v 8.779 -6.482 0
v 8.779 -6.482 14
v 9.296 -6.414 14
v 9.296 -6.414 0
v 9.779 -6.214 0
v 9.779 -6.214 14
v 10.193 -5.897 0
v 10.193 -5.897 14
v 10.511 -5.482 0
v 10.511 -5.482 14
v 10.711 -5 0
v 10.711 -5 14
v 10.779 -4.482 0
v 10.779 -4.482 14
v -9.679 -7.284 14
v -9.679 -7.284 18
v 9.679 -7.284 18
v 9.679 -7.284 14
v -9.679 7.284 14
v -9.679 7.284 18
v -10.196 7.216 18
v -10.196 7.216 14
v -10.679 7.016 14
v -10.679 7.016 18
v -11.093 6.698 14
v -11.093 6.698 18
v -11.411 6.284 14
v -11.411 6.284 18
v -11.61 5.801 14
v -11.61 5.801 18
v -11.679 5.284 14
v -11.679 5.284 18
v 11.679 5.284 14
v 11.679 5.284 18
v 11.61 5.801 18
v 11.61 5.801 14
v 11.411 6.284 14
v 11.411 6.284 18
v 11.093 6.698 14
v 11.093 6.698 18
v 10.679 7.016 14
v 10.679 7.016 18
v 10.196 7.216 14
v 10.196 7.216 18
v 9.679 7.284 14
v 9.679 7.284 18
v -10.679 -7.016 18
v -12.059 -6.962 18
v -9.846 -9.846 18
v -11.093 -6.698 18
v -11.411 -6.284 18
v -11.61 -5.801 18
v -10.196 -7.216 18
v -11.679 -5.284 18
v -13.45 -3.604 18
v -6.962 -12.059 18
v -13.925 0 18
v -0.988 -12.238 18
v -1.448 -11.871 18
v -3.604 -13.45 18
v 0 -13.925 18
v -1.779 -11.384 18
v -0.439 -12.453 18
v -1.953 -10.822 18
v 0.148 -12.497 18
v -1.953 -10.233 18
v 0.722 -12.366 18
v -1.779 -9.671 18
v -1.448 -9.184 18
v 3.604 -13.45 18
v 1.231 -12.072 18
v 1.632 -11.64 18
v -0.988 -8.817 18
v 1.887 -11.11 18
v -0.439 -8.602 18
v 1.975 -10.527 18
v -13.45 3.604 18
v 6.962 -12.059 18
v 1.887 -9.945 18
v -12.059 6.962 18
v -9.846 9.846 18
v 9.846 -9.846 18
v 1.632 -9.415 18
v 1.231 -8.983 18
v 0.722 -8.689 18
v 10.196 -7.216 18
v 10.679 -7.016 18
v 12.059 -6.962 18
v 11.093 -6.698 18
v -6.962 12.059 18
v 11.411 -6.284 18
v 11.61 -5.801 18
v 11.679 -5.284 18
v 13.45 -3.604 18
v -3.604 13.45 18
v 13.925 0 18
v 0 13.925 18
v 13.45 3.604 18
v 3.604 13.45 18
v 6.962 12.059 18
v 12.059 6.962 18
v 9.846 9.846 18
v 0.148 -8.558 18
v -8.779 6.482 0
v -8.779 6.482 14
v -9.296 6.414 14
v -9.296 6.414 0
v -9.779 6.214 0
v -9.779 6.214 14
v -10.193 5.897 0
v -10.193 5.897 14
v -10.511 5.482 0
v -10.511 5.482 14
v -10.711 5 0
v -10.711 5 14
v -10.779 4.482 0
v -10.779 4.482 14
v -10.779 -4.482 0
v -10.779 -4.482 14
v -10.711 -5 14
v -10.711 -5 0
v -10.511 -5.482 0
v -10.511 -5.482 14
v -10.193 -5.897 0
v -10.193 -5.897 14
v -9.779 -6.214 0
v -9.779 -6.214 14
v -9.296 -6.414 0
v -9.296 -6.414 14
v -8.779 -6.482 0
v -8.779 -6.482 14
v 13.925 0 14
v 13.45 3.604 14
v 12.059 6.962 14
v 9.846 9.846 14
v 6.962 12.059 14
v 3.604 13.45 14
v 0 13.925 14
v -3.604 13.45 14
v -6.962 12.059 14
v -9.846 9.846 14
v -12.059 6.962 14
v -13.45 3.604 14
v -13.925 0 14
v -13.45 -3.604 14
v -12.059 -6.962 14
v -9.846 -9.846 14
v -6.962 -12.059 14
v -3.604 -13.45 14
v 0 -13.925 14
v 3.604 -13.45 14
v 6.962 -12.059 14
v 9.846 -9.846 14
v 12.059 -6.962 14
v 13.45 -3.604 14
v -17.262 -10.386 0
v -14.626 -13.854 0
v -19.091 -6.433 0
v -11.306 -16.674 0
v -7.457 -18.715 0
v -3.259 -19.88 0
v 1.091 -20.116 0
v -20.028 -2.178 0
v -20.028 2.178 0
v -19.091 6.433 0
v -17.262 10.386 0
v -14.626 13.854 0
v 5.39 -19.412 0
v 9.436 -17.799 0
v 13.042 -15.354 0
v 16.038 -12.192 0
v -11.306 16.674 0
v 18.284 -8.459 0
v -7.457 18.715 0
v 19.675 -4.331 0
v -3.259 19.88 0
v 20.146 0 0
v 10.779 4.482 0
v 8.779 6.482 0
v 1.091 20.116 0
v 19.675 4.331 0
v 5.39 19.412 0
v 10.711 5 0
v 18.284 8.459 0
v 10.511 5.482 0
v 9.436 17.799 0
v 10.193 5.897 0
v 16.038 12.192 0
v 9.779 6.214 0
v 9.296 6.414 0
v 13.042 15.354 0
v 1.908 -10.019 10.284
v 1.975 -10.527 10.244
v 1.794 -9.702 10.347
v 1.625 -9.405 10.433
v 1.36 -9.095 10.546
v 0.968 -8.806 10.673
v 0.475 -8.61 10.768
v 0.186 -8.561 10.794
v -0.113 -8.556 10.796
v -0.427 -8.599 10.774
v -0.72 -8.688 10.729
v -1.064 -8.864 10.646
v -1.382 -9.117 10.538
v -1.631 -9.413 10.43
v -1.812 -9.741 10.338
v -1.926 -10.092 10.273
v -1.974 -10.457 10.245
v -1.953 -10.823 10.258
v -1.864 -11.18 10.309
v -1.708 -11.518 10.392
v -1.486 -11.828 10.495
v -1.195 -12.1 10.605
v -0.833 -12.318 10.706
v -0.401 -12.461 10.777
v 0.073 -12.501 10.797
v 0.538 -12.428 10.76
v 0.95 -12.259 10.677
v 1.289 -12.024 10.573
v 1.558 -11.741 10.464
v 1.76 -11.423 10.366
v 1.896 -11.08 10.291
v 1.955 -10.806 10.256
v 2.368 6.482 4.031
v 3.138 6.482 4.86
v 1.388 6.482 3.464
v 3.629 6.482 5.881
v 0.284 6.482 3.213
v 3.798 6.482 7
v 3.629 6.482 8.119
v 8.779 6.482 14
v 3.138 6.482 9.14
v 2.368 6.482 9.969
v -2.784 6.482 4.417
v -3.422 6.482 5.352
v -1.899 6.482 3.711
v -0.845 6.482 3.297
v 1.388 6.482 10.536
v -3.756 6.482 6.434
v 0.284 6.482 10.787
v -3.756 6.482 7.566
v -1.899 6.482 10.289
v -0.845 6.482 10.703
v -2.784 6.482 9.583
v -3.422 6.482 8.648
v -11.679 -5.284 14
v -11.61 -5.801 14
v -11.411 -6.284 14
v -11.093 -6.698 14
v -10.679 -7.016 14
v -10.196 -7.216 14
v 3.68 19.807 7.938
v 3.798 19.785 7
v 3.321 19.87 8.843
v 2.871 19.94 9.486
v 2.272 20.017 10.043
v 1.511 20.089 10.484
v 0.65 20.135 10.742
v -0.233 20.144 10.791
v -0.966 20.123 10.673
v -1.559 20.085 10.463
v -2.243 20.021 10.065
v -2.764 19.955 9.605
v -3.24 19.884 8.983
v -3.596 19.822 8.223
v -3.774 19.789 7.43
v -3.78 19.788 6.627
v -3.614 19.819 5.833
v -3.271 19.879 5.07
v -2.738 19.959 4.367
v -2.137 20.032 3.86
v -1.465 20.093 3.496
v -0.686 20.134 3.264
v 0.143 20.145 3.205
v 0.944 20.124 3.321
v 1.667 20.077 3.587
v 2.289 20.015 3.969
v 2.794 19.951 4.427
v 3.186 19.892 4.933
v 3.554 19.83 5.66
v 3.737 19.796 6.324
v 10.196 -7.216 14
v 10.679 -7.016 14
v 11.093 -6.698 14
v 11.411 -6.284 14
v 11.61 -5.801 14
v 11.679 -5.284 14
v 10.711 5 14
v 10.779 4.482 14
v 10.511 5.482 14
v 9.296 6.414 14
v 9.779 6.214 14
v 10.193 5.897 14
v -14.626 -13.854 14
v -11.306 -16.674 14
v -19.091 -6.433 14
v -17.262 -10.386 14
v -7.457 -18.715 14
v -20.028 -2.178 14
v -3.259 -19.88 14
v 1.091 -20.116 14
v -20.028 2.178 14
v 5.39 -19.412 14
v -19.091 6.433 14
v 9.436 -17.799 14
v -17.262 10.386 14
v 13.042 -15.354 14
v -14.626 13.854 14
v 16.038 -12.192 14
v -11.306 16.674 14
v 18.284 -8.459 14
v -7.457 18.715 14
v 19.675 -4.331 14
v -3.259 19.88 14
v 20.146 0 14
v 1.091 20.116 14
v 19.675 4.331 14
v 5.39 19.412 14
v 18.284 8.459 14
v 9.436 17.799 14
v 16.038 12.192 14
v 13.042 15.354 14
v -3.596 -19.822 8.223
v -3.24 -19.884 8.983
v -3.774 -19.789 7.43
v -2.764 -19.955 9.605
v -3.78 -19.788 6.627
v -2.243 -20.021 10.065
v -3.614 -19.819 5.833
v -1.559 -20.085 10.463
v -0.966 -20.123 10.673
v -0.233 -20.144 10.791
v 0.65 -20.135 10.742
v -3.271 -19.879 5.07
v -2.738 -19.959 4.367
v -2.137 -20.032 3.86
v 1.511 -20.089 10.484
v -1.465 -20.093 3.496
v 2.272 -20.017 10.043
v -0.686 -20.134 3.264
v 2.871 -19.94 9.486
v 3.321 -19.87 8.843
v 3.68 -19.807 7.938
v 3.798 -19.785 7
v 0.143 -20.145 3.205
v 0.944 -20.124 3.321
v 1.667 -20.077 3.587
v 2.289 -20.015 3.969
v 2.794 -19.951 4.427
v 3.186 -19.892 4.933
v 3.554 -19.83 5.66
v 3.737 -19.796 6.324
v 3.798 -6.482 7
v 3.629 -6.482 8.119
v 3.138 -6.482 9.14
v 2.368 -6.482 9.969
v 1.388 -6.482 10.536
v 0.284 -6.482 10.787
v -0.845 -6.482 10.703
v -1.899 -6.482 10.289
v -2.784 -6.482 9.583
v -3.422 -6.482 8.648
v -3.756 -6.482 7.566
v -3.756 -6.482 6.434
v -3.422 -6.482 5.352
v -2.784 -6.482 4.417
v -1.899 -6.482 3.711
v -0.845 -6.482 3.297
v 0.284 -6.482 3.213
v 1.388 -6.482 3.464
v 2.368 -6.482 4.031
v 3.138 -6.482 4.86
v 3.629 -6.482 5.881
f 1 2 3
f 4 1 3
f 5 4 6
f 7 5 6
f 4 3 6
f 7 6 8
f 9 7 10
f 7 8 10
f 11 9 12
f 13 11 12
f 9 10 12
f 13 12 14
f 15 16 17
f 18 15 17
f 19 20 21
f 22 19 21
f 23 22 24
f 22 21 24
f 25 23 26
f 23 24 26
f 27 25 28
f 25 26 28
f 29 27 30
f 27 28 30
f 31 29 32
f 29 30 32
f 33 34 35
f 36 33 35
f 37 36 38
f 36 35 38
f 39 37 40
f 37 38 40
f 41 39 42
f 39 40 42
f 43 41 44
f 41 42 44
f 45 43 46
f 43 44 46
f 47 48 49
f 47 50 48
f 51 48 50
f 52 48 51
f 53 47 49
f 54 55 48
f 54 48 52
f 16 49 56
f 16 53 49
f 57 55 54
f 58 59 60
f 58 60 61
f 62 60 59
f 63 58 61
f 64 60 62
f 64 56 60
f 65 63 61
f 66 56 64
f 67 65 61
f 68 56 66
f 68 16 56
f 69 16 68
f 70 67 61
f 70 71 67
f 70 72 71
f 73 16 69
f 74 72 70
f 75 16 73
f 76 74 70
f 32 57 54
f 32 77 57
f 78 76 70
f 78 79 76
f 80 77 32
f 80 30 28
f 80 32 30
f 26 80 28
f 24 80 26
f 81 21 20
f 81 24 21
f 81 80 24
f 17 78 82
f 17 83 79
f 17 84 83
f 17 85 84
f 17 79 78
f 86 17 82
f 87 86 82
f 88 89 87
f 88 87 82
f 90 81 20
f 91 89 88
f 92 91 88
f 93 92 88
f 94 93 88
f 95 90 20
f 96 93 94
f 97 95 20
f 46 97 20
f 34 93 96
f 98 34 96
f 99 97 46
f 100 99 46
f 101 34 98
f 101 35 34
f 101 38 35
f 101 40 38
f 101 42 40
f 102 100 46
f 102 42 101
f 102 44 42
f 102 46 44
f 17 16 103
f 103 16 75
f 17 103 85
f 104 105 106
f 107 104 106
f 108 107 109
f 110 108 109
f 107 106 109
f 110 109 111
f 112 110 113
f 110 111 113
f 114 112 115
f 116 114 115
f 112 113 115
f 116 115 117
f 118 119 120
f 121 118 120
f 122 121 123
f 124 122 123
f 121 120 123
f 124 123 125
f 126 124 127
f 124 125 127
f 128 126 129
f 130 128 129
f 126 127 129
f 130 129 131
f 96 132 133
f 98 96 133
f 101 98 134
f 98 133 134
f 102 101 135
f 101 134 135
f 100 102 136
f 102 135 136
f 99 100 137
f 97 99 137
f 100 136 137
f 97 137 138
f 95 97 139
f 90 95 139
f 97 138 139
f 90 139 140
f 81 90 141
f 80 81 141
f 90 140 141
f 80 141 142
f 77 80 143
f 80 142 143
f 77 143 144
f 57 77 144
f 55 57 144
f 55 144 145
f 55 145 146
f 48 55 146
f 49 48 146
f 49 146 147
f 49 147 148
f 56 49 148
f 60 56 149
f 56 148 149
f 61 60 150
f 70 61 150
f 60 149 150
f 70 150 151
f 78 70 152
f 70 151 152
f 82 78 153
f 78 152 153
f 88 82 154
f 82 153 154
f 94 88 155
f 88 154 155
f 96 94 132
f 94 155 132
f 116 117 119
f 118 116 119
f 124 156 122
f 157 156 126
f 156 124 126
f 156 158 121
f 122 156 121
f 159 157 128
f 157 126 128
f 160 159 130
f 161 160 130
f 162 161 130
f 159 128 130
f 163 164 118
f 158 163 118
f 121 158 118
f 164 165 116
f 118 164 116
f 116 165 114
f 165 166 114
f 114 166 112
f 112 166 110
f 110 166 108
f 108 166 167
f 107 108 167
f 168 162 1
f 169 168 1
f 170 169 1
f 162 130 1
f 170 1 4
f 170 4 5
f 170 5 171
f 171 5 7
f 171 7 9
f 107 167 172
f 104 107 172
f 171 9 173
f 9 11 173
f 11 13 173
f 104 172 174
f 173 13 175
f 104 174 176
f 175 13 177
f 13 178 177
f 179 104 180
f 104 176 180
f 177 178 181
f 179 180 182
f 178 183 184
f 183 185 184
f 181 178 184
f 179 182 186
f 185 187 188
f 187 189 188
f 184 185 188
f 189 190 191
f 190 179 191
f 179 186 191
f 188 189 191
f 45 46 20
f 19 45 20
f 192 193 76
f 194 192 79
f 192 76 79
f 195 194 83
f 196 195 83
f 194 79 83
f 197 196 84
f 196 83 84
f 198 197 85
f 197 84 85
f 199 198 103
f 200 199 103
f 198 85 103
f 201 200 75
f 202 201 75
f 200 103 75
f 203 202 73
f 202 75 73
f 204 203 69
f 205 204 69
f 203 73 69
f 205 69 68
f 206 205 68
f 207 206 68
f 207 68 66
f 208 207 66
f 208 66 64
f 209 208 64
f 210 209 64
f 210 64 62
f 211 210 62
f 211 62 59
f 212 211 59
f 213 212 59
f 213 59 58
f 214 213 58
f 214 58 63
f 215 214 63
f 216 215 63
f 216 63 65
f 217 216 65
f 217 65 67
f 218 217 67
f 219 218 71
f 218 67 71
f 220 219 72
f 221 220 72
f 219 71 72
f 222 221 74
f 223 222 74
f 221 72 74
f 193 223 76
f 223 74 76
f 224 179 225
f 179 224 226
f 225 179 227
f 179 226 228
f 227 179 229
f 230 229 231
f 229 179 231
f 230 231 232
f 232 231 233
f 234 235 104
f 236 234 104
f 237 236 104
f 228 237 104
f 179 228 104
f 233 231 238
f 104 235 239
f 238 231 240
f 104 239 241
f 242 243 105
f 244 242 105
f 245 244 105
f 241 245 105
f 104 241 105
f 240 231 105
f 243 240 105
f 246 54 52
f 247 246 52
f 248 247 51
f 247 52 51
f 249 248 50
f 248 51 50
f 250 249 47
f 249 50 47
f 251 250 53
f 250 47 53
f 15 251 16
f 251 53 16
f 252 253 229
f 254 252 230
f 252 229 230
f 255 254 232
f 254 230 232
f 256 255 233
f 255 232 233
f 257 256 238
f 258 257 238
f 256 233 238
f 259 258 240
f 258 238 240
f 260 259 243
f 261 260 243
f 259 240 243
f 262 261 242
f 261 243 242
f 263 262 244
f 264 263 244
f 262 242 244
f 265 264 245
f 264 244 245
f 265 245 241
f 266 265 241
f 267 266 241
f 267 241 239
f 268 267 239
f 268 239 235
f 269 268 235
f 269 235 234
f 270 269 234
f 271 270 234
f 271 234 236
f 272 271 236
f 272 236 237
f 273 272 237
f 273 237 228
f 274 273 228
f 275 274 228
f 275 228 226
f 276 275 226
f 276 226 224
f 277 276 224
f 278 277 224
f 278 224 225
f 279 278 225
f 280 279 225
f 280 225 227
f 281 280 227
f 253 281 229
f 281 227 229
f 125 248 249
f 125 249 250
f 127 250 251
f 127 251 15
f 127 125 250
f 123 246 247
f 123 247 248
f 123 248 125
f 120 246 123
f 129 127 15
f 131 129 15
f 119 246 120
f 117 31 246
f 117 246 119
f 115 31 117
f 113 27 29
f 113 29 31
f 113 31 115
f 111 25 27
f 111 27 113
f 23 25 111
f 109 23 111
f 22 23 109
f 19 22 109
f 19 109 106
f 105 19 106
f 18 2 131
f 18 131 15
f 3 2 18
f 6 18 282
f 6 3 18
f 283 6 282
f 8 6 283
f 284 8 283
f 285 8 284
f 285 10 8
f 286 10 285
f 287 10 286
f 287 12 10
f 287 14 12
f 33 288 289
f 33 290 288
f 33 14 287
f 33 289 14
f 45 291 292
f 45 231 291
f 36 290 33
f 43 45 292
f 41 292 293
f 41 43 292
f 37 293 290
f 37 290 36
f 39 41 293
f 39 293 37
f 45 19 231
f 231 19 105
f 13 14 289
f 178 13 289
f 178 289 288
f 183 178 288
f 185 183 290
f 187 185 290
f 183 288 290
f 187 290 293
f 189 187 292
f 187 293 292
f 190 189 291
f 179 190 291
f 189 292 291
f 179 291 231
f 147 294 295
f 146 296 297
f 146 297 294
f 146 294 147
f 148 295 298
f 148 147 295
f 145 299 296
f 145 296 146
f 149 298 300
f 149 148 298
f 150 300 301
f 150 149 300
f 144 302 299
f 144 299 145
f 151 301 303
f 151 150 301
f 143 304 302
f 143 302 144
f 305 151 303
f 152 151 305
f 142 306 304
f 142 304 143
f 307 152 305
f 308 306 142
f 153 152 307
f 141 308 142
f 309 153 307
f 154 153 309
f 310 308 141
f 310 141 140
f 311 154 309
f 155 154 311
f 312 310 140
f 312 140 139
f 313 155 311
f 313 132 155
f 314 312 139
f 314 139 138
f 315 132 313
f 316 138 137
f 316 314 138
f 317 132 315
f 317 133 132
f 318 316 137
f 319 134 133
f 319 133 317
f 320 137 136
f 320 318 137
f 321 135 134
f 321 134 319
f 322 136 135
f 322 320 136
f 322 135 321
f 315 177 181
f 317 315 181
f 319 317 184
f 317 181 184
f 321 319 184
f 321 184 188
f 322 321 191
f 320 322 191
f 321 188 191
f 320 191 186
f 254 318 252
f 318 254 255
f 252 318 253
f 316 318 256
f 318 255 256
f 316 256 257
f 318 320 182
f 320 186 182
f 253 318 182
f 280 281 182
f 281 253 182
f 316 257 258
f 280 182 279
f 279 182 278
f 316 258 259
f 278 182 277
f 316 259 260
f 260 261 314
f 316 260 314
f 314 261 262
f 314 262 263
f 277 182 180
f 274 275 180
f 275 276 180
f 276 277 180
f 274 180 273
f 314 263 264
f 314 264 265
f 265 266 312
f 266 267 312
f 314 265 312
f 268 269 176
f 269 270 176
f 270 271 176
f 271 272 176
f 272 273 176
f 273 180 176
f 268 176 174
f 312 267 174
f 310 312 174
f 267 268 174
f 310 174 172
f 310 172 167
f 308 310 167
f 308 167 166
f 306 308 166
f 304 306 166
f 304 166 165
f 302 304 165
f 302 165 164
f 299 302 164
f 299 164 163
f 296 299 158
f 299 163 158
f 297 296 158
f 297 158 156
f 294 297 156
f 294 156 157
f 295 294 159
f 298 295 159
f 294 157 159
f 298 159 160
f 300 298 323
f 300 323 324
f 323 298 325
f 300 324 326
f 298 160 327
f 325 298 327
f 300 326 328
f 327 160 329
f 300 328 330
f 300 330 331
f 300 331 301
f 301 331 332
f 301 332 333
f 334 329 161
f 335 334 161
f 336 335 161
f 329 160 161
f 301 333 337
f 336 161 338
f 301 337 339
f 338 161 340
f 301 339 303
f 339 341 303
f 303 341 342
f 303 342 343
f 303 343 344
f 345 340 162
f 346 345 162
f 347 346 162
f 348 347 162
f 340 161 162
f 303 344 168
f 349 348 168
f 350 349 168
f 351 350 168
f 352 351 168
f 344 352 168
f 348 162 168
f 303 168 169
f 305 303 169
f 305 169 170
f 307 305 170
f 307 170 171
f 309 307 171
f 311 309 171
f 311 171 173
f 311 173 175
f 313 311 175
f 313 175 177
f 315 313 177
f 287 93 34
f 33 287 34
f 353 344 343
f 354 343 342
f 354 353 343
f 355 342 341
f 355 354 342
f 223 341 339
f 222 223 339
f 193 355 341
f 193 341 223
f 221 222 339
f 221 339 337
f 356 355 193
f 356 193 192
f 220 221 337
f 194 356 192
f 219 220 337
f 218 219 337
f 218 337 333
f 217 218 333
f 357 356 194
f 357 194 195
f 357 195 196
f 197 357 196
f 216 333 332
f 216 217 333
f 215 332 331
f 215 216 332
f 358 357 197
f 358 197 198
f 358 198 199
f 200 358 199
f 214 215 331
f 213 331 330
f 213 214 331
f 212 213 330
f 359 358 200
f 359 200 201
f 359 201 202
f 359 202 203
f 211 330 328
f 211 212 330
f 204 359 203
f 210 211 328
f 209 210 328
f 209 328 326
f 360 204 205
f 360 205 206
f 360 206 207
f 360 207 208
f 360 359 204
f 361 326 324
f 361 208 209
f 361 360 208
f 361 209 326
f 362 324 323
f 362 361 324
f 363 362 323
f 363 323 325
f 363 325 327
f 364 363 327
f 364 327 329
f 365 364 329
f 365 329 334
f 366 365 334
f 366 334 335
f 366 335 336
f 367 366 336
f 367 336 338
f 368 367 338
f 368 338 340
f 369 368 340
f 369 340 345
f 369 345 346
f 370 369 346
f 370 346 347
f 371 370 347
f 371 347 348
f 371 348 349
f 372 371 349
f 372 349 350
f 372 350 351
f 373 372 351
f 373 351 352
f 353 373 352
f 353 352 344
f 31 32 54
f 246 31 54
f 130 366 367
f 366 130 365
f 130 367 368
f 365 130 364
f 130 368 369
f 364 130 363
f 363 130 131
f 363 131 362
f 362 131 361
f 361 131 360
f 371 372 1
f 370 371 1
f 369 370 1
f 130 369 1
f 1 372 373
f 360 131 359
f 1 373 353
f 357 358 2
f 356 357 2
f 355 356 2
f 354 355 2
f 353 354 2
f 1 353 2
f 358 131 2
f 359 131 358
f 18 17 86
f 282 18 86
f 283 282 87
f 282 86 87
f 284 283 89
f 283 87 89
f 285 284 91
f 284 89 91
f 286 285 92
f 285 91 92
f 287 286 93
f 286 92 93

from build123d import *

# Parameters (mm, degrees)
SKETCH_R             = 20.14583
PAD_DEPTH            = 14
SKETCH001_R          = 13.924934
PAD001_DEPTH         = 4
POCKET_DEPTH         = 4
POCKET001_DEPTH      = 18.001
SKETCH004_R          = 3.798047
POCKET002_DEPTH      = 20.14683
POCKET002_DEPTH_BACK = -20.14683
SKETCH005_R          = 1.975009
POCKET003_DEPTH      = 9


with BuildPart() as part:
    # Sketch → Pad (new body)
    with BuildSketch(Plane.XY):
        Circle(SKETCH_R)
    extrude(amount=PAD_DEPTH)

    # Sketch001 (on Face3 of Pad) → Pad001 (join)
    with BuildSketch(Plane.XY.offset(14)):
        Circle(SKETCH001_R)
    extrude(amount=PAD001_DEPTH)

    # Sketch002 (on Face5 of Pad001) → Pocket (cut)
    with BuildSketch(Plane.XY.offset(18)):
        with BuildLine():
            Line((-11.678625, 5.283784), (-11.678625, -5.283784))
            ThreePointArc((-11.678625, -5.283784), (-11.092839, -6.697998), (-9.678625, -7.283784))
            Line((-9.678625, -7.283784), (9.678625, -7.283784))
            ThreePointArc((9.678625, -7.283784), (11.092839, -6.697998), (11.678625, -5.283784))
            Line((11.678625, -5.283784), (11.678625, 5.283784))
            ThreePointArc((11.678625, 5.283784), (11.092839, 6.697998), (9.678625, 7.283784))
            Line((9.678625, 7.283784), (-9.678625, 7.283784))
            ThreePointArc((-9.678625, 7.283784), (-11.092839, 6.697998), (-11.678625, 5.283784))
        make_face()
    extrude(amount=-POCKET_DEPTH, mode=Mode.SUBTRACT)

    # Sketch003 (on Face5 of Pad001) → Pocket001 (cut, through all)
    with BuildSketch(Plane.XY.offset(18)):
        with BuildLine():
            Line((-10.778705, 4.482331), (-10.778705, -4.482331))
            ThreePointArc((-10.778705, -4.482331), (-10.192919, -5.896545), (-8.778705, -6.482331))
            Line((-8.778705, -6.482331), (8.778705, -6.482331))
            ThreePointArc((8.778705, -6.482331), (10.192919, -5.896545), (10.778705, -4.482331))
            Line((10.778705, -4.482331), (10.778705, 4.482331))
            ThreePointArc((10.778705, 4.482331), (10.192919, 5.896545), (8.778705, 6.482331))
            Line((8.778705, 6.482331), (-8.778705, 6.482331))
            ThreePointArc((-8.778705, 6.482331), (-10.192919, 5.896545), (-10.778705, 4.482331))
        make_face()
    extrude(amount=-POCKET001_DEPTH, mode=Mode.SUBTRACT)

    # Sketch004 (on DatumPlane) → Pocket002 (cut, two sides)
    with BuildSketch(Plane(origin=(0, 0, 7), x_dir=(1, 0, 0), z_dir=(0, -1, 0))) as pocket002_sk:
        Circle(SKETCH004_R)
    extrude(amount=-POCKET002_DEPTH, mode=Mode.SUBTRACT)
    extrude(pocket002_sk.sketch, amount=-POCKET002_DEPTH_BACK, mode=Mode.SUBTRACT)

    # Sketch005 (on Face16 of Pocket002) → Pocket003 (cut)
    with BuildSketch(Plane.XY.offset(18)):
        with Locations((0, -10.527462)):
            Circle(SKETCH005_R)
    extrude(amount=-POCKET003_DEPTH, mode=Mode.SUBTRACT)


solid = part.part
